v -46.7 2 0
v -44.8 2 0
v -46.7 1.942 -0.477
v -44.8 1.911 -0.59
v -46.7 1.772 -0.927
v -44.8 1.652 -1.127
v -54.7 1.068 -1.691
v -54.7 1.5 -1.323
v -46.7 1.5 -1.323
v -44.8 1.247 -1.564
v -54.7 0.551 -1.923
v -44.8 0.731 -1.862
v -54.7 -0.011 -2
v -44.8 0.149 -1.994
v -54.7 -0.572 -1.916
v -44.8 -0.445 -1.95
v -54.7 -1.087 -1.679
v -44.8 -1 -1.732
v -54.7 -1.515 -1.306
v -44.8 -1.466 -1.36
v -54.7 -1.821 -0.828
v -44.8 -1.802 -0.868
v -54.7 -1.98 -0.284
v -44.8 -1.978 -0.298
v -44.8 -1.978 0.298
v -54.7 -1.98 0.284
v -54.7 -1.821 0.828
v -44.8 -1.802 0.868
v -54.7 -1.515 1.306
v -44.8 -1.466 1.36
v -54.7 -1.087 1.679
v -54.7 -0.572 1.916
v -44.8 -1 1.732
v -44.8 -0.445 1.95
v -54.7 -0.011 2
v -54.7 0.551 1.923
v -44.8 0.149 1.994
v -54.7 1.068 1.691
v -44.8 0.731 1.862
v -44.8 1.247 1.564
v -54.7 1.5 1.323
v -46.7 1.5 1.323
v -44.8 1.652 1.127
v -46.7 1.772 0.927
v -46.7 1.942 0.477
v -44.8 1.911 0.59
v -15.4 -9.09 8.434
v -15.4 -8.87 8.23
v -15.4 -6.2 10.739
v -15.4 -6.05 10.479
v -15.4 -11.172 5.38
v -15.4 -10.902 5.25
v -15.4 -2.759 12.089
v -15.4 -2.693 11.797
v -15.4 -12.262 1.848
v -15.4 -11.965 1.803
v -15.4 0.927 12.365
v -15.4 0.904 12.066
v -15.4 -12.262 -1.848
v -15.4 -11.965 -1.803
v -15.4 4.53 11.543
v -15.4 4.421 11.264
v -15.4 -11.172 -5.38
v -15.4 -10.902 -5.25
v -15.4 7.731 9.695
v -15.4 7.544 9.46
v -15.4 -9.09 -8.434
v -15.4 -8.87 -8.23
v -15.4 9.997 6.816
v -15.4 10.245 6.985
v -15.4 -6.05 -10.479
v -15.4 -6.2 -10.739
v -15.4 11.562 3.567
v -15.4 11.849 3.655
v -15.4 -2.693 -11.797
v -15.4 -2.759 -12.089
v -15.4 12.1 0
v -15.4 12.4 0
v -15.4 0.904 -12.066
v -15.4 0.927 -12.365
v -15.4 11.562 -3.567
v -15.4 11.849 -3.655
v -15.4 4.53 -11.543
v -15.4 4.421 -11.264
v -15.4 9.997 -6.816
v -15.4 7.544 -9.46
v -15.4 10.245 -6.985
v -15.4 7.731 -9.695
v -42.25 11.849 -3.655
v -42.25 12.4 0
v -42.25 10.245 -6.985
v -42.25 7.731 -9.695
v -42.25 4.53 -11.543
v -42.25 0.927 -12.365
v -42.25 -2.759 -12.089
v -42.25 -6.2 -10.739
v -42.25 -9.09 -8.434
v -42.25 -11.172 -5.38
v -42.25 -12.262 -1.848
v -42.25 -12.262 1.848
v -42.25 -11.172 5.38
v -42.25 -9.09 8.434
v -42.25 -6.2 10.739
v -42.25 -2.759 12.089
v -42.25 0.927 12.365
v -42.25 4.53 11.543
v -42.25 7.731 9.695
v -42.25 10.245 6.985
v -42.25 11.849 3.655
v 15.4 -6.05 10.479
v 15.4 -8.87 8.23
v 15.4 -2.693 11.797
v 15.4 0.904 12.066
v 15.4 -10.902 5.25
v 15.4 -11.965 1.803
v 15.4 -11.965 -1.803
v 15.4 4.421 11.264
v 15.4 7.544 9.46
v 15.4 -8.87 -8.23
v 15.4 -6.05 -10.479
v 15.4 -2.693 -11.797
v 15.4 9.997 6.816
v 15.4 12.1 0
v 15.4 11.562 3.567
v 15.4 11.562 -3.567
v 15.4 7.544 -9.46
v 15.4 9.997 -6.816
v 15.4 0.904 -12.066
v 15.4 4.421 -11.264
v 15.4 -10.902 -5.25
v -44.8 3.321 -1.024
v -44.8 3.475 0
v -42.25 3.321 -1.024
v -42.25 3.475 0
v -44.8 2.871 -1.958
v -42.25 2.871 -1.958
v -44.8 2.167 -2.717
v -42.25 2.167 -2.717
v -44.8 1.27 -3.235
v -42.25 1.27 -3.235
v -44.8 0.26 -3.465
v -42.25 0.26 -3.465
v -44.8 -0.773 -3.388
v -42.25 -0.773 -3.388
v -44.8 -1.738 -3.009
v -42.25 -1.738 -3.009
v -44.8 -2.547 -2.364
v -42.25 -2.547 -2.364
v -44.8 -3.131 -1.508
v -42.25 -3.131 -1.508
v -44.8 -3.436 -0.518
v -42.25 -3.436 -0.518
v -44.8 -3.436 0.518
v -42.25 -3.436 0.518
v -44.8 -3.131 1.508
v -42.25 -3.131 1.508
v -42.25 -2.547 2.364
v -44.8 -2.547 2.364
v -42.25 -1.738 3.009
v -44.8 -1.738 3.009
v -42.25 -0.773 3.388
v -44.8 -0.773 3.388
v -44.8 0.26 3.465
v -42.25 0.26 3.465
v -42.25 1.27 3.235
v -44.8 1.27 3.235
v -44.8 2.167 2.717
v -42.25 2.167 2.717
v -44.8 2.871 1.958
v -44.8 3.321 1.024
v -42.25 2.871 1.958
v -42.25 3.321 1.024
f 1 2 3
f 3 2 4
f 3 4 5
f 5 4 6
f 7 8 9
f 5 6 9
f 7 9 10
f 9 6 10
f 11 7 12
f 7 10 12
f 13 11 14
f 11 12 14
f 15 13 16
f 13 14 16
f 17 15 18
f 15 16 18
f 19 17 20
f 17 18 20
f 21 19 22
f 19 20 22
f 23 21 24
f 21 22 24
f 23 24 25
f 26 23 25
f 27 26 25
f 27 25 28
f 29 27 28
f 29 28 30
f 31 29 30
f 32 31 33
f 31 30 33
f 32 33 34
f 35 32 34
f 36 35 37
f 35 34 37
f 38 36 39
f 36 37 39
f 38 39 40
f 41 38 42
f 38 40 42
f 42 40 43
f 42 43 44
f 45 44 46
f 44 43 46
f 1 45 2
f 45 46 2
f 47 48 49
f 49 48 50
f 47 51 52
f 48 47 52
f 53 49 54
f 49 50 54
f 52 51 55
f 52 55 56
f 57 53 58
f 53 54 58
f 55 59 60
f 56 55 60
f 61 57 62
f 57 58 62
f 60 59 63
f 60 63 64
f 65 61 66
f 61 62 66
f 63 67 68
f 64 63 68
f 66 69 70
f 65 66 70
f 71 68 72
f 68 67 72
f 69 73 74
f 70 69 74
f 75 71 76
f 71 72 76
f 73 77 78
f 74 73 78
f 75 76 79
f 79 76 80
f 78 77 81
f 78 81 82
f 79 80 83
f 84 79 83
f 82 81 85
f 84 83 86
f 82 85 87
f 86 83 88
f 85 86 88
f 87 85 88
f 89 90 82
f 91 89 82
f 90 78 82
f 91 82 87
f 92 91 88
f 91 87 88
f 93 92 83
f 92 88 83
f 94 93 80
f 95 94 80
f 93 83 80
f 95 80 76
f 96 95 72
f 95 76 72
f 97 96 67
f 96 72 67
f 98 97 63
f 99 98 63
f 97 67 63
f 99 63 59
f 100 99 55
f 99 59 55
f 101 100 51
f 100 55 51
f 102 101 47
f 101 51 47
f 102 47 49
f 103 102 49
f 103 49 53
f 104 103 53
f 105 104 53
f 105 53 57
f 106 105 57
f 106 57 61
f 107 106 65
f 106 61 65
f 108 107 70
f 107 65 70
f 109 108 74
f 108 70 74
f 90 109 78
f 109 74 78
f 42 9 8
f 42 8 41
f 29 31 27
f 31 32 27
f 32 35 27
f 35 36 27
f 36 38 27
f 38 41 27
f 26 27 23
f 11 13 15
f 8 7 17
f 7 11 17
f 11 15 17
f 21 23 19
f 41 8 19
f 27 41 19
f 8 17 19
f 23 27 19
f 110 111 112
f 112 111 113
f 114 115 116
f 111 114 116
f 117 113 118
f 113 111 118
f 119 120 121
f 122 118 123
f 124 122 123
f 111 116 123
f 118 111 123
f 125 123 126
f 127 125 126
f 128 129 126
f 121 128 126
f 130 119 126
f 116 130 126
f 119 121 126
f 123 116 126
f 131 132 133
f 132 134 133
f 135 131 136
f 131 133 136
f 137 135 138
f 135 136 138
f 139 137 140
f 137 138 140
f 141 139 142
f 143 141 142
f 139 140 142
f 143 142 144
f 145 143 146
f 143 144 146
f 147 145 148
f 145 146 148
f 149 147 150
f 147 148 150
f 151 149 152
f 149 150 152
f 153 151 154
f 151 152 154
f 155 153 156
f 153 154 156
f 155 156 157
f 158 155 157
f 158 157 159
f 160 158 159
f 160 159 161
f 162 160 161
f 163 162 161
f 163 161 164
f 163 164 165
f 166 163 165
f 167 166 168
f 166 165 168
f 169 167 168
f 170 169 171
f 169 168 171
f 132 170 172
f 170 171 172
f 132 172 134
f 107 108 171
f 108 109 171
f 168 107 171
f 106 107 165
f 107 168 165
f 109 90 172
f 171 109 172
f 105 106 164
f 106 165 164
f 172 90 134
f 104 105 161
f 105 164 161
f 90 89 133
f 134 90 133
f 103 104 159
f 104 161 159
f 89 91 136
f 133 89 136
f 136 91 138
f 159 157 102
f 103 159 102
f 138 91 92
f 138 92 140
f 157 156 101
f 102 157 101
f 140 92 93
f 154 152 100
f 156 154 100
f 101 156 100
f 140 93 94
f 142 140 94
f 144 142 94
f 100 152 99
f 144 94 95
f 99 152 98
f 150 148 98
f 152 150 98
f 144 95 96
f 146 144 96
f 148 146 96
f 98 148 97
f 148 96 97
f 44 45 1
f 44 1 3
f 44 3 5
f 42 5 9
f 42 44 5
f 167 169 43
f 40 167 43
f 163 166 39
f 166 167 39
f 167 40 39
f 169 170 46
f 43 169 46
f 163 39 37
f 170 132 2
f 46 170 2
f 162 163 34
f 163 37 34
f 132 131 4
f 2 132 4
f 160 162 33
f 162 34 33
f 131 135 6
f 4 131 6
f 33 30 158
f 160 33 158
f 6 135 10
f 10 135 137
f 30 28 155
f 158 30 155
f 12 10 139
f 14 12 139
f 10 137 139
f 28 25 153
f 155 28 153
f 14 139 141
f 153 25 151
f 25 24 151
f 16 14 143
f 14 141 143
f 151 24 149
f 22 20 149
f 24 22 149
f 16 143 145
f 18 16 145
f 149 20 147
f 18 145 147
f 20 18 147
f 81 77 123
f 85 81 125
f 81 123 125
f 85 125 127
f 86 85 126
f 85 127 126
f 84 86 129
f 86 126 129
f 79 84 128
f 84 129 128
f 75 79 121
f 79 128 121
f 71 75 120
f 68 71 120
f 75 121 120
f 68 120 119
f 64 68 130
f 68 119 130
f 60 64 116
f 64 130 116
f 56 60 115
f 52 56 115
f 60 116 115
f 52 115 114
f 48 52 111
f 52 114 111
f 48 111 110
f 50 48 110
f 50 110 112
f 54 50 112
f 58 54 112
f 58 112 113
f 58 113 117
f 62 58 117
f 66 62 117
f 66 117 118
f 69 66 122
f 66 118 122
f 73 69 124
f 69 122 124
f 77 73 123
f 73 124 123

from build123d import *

# Parameters (mm, degrees)
CUT_EXTRUDE1_START = -8
CUT_EXTRUDE1_DEPTH = 8


with BuildPart() as part:
    # Sketch2 → Revolve3 (revolve)
    with BuildSketch(Plane.XY):
        Polygon((-42.25, 12.4), (-15.4, 12.4), (-15.4, 12.1), (15.4, 12.1), (15.4, 0), (-54.7, 0), (-54.7, 2), (-44.8, 2), (-44.8, 3.475), (-42.25, 3.475), align=None)
    revolve(axis=Axis((-28.825, 0, 0), (-1, 0, 0)))

    # Sketch3 → Cut-Extrude1 (cut)
    with BuildSketch(Plane.ZY.offset(54.7).offset(CUT_EXTRUDE1_START)):
        with BuildLine():
            Line((-1.322875656, 1.5), (1.322875656, 1.5))
            ThreePointArc((1.322875656, 1.5), (0, 2), (-1.322875656, 1.5))
        make_face()
    extrude(amount=CUT_EXTRUDE1_DEPTH, mode=Mode.SUBTRACT)


solid = part.part
